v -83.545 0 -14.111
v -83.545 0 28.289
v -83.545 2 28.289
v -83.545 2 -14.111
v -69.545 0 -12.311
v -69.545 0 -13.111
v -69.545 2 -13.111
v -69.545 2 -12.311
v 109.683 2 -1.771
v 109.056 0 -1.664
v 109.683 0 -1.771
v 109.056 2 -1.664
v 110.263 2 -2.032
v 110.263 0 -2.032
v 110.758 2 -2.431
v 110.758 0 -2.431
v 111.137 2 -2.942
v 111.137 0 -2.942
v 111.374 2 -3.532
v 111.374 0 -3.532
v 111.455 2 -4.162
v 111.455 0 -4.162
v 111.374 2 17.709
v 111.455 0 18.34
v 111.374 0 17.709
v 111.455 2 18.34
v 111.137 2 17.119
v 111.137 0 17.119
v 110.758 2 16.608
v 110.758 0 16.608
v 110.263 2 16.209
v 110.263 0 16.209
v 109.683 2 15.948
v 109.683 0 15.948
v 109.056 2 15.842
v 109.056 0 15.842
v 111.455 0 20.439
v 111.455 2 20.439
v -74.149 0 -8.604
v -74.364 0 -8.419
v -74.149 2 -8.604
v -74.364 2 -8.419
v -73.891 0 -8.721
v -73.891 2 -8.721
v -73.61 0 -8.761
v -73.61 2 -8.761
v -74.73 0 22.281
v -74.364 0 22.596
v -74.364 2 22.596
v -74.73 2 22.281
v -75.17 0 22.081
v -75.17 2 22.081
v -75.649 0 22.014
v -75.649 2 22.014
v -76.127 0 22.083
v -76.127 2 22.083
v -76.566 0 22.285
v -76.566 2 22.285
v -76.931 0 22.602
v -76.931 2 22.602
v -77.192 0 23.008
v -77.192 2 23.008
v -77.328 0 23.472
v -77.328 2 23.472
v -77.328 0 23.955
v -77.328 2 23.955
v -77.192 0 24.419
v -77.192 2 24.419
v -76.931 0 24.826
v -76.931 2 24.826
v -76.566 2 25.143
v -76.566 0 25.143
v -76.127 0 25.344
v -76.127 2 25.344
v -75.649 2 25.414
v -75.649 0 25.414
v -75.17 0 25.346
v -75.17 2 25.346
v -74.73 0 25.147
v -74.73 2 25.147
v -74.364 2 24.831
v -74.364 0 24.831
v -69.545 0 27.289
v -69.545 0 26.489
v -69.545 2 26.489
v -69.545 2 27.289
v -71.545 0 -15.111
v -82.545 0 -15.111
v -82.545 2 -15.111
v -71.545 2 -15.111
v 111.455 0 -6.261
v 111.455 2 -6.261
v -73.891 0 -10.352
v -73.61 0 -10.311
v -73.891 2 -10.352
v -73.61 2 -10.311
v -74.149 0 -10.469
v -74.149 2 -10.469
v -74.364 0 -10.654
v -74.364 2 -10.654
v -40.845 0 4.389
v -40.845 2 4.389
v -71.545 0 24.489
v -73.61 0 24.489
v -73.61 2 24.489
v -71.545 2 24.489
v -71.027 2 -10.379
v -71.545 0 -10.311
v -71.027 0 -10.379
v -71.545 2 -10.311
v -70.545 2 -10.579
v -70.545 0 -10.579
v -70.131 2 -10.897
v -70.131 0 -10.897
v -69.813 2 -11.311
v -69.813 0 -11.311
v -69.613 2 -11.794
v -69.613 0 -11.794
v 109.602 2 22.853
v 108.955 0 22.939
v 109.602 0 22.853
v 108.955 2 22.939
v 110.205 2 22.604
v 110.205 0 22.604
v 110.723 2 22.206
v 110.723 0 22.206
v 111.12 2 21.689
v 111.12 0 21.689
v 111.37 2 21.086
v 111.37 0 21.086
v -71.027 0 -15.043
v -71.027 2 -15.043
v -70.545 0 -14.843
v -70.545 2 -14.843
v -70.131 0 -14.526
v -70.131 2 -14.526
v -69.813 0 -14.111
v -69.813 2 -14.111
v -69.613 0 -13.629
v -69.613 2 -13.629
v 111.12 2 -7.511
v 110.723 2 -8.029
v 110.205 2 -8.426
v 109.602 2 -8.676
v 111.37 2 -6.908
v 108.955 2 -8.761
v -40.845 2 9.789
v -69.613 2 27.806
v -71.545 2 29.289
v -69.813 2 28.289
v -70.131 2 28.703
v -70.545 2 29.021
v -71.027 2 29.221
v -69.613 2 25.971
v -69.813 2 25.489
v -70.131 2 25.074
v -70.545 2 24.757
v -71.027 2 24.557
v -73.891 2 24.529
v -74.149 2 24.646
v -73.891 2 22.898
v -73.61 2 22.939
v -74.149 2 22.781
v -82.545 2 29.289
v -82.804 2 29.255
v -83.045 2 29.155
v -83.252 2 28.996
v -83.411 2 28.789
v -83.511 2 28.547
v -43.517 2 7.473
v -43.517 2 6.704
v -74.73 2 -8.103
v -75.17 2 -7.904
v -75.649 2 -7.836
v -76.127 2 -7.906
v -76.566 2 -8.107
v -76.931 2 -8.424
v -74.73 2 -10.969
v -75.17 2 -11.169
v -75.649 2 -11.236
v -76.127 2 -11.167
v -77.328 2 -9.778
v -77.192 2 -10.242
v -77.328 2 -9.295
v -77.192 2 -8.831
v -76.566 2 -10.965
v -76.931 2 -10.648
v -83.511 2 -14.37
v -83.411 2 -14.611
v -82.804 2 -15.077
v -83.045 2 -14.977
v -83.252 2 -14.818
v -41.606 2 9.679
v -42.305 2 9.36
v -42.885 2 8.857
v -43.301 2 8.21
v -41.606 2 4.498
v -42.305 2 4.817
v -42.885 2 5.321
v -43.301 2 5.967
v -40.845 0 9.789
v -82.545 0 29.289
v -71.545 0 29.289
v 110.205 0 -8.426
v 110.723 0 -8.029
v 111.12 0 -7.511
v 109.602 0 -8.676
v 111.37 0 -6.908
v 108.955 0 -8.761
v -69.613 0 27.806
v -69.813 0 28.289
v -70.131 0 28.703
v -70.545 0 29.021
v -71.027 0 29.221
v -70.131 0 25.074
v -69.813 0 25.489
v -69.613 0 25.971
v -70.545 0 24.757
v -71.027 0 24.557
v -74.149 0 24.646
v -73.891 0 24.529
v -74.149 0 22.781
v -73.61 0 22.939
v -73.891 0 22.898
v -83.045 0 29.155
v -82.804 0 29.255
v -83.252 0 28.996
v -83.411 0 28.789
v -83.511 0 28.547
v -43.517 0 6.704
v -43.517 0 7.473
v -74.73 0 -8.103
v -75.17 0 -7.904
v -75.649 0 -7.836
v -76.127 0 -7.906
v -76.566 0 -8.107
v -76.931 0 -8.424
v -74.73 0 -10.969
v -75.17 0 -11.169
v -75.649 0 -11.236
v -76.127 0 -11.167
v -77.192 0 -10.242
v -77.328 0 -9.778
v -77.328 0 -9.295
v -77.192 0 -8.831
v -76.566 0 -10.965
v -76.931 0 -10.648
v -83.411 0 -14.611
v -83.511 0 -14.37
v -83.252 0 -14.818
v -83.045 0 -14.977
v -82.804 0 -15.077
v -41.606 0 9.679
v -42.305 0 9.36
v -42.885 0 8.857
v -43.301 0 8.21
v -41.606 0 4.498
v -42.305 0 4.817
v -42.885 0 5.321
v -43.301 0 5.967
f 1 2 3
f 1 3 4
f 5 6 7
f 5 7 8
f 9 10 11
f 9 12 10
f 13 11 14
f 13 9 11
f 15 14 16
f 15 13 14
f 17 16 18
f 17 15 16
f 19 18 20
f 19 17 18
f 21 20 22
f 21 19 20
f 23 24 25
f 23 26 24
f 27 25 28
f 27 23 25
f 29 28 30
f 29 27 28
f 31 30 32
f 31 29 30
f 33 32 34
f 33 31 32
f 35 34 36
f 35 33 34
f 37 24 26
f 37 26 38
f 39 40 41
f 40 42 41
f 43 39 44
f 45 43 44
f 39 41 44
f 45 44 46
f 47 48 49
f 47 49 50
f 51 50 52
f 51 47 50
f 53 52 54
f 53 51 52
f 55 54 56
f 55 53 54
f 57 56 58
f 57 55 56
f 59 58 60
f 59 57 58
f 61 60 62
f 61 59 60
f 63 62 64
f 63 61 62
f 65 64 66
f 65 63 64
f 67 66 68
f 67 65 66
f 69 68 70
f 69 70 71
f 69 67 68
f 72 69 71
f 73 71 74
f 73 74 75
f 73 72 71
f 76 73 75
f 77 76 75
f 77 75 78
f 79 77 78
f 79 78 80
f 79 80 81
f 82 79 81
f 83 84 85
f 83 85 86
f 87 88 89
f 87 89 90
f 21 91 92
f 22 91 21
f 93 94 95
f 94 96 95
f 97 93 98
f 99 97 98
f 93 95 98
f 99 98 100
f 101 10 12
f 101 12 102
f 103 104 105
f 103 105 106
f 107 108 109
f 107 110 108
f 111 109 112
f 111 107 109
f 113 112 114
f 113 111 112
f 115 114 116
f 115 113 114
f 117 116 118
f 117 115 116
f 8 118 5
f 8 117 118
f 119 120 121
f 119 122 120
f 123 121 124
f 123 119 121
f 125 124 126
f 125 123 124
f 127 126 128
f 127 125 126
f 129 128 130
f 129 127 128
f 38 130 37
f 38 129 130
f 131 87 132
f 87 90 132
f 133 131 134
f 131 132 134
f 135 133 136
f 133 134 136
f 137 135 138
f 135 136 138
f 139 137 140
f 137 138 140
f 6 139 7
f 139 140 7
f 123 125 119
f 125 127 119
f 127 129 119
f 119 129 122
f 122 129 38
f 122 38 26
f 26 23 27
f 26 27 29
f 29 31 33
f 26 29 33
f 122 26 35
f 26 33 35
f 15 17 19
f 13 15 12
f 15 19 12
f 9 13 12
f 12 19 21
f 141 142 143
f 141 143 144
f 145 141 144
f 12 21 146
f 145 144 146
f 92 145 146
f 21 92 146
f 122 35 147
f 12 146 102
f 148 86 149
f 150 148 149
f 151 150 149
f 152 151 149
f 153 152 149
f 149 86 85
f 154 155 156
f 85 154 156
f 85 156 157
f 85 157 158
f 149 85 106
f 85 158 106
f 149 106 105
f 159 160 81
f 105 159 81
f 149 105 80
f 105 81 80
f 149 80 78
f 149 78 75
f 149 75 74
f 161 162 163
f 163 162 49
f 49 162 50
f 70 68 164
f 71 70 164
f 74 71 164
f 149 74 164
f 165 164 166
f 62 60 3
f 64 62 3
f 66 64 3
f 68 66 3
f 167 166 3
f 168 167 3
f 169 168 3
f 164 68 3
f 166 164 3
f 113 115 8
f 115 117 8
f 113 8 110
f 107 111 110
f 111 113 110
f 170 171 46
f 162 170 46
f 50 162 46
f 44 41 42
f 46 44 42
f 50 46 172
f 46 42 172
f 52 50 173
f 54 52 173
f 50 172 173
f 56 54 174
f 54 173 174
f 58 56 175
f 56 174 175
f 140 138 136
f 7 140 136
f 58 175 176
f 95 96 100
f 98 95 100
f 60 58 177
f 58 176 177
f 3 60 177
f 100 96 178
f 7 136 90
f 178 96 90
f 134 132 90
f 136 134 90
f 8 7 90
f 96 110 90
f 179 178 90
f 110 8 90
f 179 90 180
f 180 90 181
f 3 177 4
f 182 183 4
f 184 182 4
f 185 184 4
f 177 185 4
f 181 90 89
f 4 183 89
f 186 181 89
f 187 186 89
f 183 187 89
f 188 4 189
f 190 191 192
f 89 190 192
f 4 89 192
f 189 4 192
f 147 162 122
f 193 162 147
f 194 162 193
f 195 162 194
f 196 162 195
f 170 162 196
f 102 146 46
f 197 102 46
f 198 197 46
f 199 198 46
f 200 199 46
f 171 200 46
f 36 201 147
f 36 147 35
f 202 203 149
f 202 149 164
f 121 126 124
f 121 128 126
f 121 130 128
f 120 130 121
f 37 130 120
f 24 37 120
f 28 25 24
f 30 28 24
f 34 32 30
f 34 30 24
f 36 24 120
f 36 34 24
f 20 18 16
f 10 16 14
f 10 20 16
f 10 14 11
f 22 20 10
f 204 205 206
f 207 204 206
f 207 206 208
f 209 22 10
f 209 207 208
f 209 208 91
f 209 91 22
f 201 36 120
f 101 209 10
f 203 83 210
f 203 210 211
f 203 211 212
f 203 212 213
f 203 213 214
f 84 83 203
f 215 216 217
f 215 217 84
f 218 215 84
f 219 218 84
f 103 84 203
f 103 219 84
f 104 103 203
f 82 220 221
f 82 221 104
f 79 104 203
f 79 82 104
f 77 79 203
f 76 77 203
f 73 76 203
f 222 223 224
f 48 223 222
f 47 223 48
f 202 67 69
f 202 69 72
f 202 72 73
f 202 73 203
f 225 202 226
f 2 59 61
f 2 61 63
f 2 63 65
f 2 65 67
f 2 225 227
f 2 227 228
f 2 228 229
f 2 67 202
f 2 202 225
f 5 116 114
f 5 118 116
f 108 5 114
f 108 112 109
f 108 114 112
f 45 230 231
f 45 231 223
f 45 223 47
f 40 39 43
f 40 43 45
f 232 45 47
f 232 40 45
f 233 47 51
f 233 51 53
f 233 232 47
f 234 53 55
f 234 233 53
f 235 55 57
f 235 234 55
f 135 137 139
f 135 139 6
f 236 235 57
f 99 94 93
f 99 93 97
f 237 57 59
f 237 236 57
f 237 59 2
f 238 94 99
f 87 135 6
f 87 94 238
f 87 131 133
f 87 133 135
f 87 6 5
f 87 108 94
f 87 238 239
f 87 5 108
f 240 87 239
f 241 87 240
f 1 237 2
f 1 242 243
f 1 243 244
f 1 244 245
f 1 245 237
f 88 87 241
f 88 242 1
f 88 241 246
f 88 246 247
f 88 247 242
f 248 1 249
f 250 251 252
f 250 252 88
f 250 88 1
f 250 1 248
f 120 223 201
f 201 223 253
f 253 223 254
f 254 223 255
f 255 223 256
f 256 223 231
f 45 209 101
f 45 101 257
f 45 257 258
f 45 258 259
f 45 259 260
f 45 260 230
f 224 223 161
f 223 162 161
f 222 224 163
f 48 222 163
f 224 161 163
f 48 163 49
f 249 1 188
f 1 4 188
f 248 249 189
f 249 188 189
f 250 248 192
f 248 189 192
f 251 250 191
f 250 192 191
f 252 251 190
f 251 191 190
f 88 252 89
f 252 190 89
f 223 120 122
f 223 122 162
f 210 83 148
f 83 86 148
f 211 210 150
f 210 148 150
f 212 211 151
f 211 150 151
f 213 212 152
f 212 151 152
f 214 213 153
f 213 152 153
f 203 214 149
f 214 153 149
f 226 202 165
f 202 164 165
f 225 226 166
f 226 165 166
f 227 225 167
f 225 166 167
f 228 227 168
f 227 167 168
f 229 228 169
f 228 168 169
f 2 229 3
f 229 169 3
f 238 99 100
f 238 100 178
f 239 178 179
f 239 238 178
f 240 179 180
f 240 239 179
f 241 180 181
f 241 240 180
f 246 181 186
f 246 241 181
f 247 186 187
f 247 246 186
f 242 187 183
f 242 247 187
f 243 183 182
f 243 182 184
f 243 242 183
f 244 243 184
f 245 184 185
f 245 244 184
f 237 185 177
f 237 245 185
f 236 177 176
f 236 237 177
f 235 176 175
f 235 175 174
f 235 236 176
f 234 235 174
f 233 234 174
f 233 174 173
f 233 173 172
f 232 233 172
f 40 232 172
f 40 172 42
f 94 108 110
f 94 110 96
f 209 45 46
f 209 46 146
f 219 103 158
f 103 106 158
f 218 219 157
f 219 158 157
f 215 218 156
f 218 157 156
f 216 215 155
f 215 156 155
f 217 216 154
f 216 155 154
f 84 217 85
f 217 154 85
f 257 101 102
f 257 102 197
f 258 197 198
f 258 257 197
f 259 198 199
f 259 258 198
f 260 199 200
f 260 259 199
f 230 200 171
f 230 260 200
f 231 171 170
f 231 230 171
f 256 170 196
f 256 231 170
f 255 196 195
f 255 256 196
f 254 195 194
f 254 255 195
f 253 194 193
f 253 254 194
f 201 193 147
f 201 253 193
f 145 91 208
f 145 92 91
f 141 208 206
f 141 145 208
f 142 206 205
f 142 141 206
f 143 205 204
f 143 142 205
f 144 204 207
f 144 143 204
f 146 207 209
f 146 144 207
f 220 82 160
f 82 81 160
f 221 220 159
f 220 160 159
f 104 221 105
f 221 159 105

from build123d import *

# Parameters (mm, degrees)
BOSS_EXTRUDE1_DEPTH = 2
FILLET1_R           = 1
FILLET2_R           = 2
FILLET3_R           = 2.5


with BuildPart() as part:
    # Sketch1 → Boss-Extrude1 (new body)
    with BuildSketch(Plane(origin=(0, 0, 0), x_dir=(1, 0, 0), z_dir=(0, 1, 0))):
        with BuildLine():
            Line((-74.131846847, 10.311334612), (-69.544914922, 10.311334612))
            Line((-69.544914922, 10.311334612), (-69.544914922, 15.111334612))
            Line((-69.544914922, 15.111334612), (-83.544914922, 15.111334612))
            Line((-83.544914922, 15.111334612), (-83.544914922, -29.288665388))
            Line((-83.544914922, -29.288665388), (-69.544914922, -29.288665388))
            Line((-69.544914922, -29.288665388), (-69.544914922, -24.488665388))
            Line((-69.544914922, -24.488665388), (-74.131846847, -24.488665388))
            ThreePointArc((-74.131846847, -24.488665388), (-77.344914922, -23.713665388), (-74.131846847, -22.938665388))
            Line((-74.131846847, -22.938665388), (-69.544914922, -22.938665388))
            Line((-69.544914922, -22.938665388), (111.455085078, -22.938665388))
            Line((111.455085078, -22.938665388), (111.455085078, -15.938665388))
            Line((111.455085078, -15.938665388), (-40.844914922, -9.788665388))
            ThreePointArc((-40.844914922, -9.788665388), (-43.544914922, -7.088665388), (-40.844914922, -4.388665388))
            Line((-40.844914922, -4.388665388), (111.455085078, 1.761334612))
            Line((111.455085078, 1.761334612), (111.455085078, 8.761334612))
            Line((111.455085078, 8.761334612), (-69.544914922, 8.761334612))
            Line((-69.544914922, 8.761334612), (-74.131846847, 8.761334612))
            ThreePointArc((-74.131846847, 8.761334612), (-77.344914922, 9.536334612), (-74.131846847, 10.311334612))
        make_face()
    extrude(amount=BOSS_EXTRUDE1_DEPTH)

    # Fillet1
    fillet1_edges = [part.edges().sort_by_distance(p)[0] for p in [
        (-74.131846847, 1, 24.488665388),
        (-74.131846847, 1, 22.938665388),
        (-74.131846847, 1, -8.761334612),
        (-74.131846847, 1, -10.311334612),
        (-83.544914922, 1, -15.111334612),
        (-83.544914922, 1, 29.288665388),
    ]]
    fillet(fillet1_edges, radius=FILLET1_R)

    # Fillet2
    fillet2_edges = [part.edges().sort_by_distance(p)[0] for p in [
        (-69.544914922, 1, -15.111334612),
        (-69.544914922, 1, 29.288665388),
        (-69.544914922, 1, -10.311334612),
        (-69.544914922, 1, 24.488665388),
    ]]
    fillet(fillet2_edges, radius=FILLET2_R)

    # Fillet3
    fillet3_edges = [part.edges().sort_by_distance(p)[0] for p in [
        (111.455085078, 1, 22.938665388),
        (111.455085078, 1, 15.938665388),
        (111.455085078, 1, -8.761334612),
        (111.455085078, 1, -1.761334612),
    ]]
    fillet(fillet3_edges, radius=FILLET3_R)


solid = part.part
